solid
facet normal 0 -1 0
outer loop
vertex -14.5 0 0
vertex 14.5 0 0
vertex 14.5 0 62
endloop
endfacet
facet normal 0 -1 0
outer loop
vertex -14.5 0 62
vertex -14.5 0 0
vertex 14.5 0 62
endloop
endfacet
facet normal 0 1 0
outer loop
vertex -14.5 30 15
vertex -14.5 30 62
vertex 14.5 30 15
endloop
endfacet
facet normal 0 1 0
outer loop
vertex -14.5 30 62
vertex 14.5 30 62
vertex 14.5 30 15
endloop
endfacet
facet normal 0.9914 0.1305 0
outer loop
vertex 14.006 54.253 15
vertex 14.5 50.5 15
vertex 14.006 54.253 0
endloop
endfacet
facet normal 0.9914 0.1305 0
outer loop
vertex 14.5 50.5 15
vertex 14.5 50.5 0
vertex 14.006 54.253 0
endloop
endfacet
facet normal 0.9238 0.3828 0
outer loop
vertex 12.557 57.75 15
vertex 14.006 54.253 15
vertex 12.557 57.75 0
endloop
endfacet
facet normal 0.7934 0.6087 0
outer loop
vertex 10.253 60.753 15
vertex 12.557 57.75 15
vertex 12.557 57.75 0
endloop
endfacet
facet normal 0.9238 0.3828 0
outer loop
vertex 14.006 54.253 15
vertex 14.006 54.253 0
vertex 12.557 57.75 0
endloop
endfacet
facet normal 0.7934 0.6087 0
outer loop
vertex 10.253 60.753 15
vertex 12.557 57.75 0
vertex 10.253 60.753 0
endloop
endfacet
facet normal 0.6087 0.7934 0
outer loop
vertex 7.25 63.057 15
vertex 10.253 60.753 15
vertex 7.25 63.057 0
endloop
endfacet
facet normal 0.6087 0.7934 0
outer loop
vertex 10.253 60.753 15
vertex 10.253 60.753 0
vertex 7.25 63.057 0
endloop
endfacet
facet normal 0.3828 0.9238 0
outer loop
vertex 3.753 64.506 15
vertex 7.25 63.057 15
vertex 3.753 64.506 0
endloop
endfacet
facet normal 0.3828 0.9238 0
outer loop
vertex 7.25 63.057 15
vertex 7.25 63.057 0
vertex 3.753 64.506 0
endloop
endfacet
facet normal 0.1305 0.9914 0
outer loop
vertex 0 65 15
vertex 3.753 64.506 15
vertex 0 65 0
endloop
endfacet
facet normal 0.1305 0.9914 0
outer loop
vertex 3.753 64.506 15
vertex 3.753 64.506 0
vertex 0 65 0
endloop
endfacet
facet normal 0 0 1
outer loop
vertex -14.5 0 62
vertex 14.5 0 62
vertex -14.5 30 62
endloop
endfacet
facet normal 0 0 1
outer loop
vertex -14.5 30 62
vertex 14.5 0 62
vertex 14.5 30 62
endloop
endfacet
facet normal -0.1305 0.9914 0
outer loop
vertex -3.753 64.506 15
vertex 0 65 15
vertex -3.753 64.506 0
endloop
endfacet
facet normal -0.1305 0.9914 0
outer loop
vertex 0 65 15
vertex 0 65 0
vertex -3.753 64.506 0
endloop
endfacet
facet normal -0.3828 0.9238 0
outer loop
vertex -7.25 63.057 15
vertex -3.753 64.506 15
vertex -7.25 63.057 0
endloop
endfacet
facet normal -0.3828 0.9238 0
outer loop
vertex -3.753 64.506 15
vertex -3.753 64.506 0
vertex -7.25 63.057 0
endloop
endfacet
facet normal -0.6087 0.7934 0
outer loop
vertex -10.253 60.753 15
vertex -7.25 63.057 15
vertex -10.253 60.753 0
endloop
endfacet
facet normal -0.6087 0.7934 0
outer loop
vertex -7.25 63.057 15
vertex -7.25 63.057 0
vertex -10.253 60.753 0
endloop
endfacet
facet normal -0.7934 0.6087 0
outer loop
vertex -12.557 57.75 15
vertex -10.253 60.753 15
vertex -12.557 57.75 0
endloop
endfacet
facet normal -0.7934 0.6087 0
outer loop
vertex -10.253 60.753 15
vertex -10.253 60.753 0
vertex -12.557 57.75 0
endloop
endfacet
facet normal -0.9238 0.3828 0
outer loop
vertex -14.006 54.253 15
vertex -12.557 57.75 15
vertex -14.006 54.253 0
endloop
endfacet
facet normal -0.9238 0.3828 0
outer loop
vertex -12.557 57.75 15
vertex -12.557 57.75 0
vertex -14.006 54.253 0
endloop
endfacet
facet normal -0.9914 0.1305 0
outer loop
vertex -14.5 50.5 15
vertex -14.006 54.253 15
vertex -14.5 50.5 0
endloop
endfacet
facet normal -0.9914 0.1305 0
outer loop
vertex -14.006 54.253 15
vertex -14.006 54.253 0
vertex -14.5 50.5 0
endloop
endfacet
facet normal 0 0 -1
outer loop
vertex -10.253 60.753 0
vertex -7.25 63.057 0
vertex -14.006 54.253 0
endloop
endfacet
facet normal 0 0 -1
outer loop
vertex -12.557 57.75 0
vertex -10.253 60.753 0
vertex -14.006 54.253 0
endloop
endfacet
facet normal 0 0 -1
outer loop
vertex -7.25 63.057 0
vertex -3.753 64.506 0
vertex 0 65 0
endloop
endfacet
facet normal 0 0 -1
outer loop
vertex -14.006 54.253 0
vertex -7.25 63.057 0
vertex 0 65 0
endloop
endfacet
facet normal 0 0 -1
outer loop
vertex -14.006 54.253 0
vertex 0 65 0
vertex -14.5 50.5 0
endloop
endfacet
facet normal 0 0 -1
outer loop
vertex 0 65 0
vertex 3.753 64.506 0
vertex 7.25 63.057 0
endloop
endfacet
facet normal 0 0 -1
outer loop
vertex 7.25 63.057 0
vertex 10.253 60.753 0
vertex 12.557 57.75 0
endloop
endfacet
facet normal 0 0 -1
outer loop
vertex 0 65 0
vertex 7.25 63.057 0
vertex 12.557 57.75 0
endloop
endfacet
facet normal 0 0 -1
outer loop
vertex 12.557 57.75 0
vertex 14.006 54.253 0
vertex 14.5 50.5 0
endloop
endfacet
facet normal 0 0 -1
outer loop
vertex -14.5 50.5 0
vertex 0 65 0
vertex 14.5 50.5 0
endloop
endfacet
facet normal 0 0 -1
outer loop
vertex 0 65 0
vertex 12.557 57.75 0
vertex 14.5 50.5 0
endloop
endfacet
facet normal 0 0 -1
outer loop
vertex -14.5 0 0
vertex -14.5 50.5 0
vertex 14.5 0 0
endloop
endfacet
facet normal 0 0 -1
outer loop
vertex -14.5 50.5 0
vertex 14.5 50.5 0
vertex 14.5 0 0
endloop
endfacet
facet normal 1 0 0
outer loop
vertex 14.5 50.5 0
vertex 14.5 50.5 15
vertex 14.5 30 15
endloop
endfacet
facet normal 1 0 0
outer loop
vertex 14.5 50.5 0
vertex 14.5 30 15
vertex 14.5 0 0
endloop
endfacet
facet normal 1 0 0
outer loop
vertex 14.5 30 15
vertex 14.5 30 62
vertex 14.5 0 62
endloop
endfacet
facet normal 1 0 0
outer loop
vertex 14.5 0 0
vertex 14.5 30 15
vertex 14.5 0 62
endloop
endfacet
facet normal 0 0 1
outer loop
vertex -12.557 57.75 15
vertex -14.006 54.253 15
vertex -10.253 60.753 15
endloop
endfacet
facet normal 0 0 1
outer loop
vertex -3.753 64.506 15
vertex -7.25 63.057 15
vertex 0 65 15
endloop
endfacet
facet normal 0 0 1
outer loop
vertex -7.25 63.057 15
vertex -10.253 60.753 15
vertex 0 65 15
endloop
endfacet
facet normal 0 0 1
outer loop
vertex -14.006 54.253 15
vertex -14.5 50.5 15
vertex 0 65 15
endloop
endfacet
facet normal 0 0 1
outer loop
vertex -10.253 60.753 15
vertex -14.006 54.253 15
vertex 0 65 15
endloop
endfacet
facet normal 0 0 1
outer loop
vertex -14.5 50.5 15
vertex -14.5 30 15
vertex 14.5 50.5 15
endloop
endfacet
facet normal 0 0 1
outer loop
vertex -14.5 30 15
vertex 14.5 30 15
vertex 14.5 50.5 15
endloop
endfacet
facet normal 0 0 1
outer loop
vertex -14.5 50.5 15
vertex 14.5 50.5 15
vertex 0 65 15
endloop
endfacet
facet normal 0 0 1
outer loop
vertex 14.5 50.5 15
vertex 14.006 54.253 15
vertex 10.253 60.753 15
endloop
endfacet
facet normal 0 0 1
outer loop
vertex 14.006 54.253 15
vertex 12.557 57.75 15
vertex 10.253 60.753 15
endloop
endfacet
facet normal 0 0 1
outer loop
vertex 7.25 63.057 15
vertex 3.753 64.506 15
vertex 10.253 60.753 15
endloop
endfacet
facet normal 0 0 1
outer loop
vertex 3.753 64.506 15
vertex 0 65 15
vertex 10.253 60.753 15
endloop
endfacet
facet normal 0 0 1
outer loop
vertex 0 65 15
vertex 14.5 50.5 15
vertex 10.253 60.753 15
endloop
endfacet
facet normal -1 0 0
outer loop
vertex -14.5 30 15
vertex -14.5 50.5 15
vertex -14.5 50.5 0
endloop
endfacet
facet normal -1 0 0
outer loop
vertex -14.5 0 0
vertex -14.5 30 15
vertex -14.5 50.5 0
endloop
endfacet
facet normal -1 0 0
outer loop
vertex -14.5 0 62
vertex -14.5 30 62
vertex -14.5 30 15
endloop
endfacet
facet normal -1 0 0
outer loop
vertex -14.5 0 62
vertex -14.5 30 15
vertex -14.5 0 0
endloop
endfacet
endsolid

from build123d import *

# Parameters (mm, degrees)
BOSS_EXTRUDE1_DEPTH = 14.5
FILLET2_R           = 14.5


with BuildPart() as part:
    # Sketch1 → Boss-Extrude1 (new, symmetric)
    with BuildSketch(Plane.YZ):
        Polygon((0, 0), (0, 62), (30, 62), (30, 15), (65, 15), (65, 0), align=None)
    extrude(amount=BOSS_EXTRUDE1_DEPTH, both=True)

    # Fillet2
    fillet2_edges = [part.edges().sort_by_distance(p)[0] for p in [
        (-14.5, 65, 7.5),
        (14.5, 65, 7.5),
    ]]
    fillet(fillet2_edges, radius=FILLET2_R - 0.0001)  # a hair under: the kernel refuses the full size


solid = part.part
